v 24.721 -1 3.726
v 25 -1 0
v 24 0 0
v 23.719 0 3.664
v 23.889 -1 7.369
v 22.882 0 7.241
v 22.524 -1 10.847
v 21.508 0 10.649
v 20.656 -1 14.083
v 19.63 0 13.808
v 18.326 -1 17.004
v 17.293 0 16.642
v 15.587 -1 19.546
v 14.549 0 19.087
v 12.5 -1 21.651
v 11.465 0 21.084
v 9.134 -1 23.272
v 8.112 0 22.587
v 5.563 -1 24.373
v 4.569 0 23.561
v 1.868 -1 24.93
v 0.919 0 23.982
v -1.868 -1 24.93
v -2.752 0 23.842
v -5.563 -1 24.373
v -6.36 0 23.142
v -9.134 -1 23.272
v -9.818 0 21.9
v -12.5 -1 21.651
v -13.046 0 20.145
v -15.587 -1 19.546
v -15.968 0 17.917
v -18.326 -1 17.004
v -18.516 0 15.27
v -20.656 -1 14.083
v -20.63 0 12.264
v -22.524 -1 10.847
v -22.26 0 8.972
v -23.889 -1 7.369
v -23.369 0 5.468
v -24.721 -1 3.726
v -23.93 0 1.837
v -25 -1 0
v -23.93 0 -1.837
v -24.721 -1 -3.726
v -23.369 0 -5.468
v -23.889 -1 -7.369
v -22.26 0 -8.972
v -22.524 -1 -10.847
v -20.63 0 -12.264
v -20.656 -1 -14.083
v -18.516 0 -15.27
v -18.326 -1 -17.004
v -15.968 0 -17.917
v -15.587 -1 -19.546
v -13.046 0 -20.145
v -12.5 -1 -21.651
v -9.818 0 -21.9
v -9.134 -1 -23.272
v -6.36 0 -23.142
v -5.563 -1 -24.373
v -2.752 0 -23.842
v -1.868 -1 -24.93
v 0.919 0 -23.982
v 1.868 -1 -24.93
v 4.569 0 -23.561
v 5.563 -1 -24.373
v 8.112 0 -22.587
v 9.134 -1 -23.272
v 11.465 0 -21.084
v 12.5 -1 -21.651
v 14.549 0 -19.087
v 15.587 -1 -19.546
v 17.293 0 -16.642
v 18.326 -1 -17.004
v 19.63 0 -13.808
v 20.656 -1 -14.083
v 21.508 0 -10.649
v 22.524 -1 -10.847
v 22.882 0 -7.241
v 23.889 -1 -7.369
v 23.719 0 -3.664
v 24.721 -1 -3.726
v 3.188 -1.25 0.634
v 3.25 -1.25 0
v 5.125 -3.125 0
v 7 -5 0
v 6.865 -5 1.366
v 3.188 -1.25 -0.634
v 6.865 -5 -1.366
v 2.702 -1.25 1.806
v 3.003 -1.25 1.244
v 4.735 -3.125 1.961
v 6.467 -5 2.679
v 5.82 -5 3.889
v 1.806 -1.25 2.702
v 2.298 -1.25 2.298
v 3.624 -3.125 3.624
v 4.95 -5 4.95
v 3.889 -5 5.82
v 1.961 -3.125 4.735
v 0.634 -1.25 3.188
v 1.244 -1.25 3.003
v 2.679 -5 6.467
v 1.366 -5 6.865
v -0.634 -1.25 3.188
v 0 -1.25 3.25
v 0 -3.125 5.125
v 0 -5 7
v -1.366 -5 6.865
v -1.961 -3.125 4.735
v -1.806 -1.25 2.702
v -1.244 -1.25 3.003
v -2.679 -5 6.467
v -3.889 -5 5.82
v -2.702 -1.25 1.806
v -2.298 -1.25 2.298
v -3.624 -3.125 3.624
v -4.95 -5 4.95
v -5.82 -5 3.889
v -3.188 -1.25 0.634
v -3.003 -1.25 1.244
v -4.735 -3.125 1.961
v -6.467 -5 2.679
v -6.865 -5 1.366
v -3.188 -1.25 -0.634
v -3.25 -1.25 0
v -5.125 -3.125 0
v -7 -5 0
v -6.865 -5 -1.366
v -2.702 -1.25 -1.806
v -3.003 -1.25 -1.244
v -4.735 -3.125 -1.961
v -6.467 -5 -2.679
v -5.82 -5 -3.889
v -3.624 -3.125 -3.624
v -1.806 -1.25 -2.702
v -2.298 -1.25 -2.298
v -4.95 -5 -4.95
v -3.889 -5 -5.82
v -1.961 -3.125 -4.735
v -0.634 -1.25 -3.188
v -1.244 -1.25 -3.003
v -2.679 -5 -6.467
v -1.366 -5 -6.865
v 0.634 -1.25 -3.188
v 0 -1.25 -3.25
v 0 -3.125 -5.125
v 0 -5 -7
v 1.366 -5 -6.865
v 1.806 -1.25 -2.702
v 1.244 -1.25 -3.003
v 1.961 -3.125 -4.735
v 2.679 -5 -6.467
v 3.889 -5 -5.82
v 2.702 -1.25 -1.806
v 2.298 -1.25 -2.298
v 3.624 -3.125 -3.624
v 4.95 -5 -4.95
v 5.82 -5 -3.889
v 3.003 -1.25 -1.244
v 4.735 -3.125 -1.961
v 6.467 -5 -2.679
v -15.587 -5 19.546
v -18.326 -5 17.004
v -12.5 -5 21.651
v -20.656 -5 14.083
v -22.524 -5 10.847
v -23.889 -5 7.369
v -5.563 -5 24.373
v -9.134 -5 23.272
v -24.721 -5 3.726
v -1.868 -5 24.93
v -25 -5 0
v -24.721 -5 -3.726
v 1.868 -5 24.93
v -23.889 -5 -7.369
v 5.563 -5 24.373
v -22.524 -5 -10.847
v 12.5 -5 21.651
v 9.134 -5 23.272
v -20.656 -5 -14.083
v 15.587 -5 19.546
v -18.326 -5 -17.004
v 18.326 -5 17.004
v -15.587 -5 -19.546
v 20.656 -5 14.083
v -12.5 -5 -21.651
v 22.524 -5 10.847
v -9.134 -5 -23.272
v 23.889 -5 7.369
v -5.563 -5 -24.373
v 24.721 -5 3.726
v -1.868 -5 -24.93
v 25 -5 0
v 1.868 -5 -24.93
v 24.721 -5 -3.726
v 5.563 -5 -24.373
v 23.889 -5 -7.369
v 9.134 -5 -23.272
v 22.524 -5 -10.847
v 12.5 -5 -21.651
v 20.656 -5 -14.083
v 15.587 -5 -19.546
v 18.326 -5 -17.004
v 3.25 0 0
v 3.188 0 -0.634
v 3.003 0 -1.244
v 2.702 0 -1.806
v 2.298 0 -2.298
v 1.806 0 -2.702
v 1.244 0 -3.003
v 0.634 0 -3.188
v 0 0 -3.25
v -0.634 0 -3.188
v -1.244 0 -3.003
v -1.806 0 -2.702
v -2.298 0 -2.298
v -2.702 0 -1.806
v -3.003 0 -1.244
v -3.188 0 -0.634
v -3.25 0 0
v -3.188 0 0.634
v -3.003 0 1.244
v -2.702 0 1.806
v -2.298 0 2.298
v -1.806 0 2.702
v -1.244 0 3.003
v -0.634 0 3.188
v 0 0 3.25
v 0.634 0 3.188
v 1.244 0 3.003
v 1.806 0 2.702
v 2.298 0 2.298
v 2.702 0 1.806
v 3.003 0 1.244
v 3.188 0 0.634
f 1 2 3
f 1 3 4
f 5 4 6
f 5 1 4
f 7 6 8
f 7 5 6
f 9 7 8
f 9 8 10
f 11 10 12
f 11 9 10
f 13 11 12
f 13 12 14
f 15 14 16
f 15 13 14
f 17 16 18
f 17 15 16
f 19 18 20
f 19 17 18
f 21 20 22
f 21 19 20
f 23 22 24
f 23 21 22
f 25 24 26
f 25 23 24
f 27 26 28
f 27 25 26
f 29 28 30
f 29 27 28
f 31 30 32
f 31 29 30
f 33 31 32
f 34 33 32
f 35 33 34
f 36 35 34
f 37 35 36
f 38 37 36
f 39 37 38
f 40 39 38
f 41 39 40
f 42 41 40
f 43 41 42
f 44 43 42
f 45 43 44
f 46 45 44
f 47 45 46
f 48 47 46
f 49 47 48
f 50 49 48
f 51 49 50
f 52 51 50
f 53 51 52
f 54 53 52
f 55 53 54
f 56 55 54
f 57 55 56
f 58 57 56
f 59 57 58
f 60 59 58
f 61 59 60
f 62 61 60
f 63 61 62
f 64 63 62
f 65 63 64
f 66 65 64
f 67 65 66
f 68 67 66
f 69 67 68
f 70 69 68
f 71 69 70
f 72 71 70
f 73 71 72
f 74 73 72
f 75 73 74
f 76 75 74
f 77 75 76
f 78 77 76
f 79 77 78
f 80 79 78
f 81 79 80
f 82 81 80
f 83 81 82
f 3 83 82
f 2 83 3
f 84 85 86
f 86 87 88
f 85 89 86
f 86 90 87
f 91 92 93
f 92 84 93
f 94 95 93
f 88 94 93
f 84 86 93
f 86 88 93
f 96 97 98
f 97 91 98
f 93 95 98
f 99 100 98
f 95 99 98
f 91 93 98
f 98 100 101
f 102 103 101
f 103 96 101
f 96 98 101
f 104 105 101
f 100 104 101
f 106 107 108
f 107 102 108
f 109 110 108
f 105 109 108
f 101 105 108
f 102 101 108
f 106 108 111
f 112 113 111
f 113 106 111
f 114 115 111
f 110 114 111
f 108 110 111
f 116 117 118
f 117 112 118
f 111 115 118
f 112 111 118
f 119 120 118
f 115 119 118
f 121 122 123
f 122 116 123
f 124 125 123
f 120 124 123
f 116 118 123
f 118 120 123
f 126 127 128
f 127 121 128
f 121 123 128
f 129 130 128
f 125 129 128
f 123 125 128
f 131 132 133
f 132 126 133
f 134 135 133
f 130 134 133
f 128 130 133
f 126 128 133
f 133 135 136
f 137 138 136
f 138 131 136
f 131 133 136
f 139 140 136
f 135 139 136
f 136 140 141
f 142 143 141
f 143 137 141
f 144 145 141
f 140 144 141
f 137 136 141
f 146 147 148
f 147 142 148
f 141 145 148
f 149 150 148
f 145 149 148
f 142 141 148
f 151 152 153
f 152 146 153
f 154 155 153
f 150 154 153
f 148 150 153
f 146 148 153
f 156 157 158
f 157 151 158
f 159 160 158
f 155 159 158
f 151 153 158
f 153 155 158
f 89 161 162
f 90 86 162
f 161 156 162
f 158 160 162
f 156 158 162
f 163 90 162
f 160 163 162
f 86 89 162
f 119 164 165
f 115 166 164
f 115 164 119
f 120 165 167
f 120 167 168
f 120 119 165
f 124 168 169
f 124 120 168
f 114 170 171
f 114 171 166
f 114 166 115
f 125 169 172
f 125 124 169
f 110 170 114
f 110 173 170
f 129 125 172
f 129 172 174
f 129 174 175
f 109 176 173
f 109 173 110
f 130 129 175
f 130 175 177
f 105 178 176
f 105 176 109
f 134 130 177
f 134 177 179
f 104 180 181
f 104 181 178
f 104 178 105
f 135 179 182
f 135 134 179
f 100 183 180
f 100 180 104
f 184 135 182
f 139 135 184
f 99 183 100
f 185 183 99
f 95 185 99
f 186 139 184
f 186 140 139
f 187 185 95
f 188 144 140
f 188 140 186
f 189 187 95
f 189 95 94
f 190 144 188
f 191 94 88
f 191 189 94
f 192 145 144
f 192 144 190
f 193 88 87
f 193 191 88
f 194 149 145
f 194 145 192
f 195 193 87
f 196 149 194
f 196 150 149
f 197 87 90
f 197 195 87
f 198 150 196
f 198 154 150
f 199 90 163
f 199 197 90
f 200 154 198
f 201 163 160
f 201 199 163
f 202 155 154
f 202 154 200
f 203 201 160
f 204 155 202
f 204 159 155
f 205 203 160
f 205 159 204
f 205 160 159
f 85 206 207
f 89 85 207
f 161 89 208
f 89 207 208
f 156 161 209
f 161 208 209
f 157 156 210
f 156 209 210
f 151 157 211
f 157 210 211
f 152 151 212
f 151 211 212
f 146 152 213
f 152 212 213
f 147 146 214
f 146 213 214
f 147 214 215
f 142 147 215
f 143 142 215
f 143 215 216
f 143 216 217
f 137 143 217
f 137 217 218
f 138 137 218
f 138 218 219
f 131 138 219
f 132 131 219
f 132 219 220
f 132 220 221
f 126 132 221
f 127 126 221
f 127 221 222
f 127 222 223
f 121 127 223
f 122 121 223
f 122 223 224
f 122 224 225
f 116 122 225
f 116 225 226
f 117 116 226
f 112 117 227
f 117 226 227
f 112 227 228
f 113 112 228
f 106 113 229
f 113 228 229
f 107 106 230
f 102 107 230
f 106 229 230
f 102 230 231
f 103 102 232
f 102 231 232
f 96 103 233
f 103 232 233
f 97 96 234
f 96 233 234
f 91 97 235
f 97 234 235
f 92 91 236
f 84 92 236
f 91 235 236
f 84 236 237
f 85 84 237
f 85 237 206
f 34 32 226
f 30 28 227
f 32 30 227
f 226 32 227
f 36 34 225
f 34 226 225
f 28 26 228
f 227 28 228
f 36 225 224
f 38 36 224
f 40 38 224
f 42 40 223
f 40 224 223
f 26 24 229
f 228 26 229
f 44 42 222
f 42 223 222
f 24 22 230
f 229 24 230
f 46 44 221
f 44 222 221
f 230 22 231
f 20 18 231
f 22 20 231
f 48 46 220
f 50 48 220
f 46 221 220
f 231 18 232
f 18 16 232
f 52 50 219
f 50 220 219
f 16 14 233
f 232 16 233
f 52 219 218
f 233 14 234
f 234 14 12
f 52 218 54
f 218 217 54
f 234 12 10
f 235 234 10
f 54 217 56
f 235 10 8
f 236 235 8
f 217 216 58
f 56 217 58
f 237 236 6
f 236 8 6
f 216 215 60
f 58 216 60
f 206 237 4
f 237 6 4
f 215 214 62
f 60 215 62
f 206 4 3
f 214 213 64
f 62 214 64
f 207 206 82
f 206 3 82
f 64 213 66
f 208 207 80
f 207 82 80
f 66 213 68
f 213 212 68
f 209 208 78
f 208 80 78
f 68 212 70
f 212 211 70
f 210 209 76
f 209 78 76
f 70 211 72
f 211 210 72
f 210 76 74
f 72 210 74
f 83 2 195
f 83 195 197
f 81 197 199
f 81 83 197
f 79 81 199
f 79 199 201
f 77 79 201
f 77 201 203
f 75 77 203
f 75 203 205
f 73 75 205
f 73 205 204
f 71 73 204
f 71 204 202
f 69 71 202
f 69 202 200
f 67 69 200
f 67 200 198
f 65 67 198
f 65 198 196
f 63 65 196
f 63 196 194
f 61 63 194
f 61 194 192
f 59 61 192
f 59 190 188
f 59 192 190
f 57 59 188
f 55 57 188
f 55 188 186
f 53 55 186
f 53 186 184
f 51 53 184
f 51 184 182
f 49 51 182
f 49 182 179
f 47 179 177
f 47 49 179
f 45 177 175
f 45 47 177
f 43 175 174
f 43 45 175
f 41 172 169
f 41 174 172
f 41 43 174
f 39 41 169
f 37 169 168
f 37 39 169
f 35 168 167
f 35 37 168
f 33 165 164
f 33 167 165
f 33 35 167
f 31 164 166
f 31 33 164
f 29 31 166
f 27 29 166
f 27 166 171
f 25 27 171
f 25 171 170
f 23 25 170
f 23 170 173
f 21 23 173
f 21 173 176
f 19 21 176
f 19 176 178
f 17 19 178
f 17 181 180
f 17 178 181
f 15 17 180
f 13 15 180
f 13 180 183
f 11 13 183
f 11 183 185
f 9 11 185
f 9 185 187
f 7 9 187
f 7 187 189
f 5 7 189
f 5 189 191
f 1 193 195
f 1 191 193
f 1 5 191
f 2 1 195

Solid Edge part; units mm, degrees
sketch "Sketch1" plane through (0, 0, 0) normal (0, -1, 0) x (1, 0, 0)
  circle A0 centre (0, 0) radius 25
  dimension "D1" = 50
extrude "Protrusion1" add sketch "Sketch1" along normal blind 5
chamfer "Chaflán_3" distance 1 angle 45 1 edges at (-25, 0, 0)
sketch "Sketch2" plane through (0, 0, 0) normal (0, 0, 1) x (1, 0, 0)
  line L0 (3.25, -1.25) -> (7, -5)
  line L1 (3.25, -1.25) -> (3.25, 0)
  dimension "D1" = 3.25
  dimension "D2" = 1.25
revolve "RevolvedCutout1" cut sketch "Sketch2" angle 360 about axis through (0, 0, 0) along (0, 1, 0) material side at (5.0896, -3.1604, 0)
properties part number "1976-1100-001" material "Aluminio, 7075-T6"
